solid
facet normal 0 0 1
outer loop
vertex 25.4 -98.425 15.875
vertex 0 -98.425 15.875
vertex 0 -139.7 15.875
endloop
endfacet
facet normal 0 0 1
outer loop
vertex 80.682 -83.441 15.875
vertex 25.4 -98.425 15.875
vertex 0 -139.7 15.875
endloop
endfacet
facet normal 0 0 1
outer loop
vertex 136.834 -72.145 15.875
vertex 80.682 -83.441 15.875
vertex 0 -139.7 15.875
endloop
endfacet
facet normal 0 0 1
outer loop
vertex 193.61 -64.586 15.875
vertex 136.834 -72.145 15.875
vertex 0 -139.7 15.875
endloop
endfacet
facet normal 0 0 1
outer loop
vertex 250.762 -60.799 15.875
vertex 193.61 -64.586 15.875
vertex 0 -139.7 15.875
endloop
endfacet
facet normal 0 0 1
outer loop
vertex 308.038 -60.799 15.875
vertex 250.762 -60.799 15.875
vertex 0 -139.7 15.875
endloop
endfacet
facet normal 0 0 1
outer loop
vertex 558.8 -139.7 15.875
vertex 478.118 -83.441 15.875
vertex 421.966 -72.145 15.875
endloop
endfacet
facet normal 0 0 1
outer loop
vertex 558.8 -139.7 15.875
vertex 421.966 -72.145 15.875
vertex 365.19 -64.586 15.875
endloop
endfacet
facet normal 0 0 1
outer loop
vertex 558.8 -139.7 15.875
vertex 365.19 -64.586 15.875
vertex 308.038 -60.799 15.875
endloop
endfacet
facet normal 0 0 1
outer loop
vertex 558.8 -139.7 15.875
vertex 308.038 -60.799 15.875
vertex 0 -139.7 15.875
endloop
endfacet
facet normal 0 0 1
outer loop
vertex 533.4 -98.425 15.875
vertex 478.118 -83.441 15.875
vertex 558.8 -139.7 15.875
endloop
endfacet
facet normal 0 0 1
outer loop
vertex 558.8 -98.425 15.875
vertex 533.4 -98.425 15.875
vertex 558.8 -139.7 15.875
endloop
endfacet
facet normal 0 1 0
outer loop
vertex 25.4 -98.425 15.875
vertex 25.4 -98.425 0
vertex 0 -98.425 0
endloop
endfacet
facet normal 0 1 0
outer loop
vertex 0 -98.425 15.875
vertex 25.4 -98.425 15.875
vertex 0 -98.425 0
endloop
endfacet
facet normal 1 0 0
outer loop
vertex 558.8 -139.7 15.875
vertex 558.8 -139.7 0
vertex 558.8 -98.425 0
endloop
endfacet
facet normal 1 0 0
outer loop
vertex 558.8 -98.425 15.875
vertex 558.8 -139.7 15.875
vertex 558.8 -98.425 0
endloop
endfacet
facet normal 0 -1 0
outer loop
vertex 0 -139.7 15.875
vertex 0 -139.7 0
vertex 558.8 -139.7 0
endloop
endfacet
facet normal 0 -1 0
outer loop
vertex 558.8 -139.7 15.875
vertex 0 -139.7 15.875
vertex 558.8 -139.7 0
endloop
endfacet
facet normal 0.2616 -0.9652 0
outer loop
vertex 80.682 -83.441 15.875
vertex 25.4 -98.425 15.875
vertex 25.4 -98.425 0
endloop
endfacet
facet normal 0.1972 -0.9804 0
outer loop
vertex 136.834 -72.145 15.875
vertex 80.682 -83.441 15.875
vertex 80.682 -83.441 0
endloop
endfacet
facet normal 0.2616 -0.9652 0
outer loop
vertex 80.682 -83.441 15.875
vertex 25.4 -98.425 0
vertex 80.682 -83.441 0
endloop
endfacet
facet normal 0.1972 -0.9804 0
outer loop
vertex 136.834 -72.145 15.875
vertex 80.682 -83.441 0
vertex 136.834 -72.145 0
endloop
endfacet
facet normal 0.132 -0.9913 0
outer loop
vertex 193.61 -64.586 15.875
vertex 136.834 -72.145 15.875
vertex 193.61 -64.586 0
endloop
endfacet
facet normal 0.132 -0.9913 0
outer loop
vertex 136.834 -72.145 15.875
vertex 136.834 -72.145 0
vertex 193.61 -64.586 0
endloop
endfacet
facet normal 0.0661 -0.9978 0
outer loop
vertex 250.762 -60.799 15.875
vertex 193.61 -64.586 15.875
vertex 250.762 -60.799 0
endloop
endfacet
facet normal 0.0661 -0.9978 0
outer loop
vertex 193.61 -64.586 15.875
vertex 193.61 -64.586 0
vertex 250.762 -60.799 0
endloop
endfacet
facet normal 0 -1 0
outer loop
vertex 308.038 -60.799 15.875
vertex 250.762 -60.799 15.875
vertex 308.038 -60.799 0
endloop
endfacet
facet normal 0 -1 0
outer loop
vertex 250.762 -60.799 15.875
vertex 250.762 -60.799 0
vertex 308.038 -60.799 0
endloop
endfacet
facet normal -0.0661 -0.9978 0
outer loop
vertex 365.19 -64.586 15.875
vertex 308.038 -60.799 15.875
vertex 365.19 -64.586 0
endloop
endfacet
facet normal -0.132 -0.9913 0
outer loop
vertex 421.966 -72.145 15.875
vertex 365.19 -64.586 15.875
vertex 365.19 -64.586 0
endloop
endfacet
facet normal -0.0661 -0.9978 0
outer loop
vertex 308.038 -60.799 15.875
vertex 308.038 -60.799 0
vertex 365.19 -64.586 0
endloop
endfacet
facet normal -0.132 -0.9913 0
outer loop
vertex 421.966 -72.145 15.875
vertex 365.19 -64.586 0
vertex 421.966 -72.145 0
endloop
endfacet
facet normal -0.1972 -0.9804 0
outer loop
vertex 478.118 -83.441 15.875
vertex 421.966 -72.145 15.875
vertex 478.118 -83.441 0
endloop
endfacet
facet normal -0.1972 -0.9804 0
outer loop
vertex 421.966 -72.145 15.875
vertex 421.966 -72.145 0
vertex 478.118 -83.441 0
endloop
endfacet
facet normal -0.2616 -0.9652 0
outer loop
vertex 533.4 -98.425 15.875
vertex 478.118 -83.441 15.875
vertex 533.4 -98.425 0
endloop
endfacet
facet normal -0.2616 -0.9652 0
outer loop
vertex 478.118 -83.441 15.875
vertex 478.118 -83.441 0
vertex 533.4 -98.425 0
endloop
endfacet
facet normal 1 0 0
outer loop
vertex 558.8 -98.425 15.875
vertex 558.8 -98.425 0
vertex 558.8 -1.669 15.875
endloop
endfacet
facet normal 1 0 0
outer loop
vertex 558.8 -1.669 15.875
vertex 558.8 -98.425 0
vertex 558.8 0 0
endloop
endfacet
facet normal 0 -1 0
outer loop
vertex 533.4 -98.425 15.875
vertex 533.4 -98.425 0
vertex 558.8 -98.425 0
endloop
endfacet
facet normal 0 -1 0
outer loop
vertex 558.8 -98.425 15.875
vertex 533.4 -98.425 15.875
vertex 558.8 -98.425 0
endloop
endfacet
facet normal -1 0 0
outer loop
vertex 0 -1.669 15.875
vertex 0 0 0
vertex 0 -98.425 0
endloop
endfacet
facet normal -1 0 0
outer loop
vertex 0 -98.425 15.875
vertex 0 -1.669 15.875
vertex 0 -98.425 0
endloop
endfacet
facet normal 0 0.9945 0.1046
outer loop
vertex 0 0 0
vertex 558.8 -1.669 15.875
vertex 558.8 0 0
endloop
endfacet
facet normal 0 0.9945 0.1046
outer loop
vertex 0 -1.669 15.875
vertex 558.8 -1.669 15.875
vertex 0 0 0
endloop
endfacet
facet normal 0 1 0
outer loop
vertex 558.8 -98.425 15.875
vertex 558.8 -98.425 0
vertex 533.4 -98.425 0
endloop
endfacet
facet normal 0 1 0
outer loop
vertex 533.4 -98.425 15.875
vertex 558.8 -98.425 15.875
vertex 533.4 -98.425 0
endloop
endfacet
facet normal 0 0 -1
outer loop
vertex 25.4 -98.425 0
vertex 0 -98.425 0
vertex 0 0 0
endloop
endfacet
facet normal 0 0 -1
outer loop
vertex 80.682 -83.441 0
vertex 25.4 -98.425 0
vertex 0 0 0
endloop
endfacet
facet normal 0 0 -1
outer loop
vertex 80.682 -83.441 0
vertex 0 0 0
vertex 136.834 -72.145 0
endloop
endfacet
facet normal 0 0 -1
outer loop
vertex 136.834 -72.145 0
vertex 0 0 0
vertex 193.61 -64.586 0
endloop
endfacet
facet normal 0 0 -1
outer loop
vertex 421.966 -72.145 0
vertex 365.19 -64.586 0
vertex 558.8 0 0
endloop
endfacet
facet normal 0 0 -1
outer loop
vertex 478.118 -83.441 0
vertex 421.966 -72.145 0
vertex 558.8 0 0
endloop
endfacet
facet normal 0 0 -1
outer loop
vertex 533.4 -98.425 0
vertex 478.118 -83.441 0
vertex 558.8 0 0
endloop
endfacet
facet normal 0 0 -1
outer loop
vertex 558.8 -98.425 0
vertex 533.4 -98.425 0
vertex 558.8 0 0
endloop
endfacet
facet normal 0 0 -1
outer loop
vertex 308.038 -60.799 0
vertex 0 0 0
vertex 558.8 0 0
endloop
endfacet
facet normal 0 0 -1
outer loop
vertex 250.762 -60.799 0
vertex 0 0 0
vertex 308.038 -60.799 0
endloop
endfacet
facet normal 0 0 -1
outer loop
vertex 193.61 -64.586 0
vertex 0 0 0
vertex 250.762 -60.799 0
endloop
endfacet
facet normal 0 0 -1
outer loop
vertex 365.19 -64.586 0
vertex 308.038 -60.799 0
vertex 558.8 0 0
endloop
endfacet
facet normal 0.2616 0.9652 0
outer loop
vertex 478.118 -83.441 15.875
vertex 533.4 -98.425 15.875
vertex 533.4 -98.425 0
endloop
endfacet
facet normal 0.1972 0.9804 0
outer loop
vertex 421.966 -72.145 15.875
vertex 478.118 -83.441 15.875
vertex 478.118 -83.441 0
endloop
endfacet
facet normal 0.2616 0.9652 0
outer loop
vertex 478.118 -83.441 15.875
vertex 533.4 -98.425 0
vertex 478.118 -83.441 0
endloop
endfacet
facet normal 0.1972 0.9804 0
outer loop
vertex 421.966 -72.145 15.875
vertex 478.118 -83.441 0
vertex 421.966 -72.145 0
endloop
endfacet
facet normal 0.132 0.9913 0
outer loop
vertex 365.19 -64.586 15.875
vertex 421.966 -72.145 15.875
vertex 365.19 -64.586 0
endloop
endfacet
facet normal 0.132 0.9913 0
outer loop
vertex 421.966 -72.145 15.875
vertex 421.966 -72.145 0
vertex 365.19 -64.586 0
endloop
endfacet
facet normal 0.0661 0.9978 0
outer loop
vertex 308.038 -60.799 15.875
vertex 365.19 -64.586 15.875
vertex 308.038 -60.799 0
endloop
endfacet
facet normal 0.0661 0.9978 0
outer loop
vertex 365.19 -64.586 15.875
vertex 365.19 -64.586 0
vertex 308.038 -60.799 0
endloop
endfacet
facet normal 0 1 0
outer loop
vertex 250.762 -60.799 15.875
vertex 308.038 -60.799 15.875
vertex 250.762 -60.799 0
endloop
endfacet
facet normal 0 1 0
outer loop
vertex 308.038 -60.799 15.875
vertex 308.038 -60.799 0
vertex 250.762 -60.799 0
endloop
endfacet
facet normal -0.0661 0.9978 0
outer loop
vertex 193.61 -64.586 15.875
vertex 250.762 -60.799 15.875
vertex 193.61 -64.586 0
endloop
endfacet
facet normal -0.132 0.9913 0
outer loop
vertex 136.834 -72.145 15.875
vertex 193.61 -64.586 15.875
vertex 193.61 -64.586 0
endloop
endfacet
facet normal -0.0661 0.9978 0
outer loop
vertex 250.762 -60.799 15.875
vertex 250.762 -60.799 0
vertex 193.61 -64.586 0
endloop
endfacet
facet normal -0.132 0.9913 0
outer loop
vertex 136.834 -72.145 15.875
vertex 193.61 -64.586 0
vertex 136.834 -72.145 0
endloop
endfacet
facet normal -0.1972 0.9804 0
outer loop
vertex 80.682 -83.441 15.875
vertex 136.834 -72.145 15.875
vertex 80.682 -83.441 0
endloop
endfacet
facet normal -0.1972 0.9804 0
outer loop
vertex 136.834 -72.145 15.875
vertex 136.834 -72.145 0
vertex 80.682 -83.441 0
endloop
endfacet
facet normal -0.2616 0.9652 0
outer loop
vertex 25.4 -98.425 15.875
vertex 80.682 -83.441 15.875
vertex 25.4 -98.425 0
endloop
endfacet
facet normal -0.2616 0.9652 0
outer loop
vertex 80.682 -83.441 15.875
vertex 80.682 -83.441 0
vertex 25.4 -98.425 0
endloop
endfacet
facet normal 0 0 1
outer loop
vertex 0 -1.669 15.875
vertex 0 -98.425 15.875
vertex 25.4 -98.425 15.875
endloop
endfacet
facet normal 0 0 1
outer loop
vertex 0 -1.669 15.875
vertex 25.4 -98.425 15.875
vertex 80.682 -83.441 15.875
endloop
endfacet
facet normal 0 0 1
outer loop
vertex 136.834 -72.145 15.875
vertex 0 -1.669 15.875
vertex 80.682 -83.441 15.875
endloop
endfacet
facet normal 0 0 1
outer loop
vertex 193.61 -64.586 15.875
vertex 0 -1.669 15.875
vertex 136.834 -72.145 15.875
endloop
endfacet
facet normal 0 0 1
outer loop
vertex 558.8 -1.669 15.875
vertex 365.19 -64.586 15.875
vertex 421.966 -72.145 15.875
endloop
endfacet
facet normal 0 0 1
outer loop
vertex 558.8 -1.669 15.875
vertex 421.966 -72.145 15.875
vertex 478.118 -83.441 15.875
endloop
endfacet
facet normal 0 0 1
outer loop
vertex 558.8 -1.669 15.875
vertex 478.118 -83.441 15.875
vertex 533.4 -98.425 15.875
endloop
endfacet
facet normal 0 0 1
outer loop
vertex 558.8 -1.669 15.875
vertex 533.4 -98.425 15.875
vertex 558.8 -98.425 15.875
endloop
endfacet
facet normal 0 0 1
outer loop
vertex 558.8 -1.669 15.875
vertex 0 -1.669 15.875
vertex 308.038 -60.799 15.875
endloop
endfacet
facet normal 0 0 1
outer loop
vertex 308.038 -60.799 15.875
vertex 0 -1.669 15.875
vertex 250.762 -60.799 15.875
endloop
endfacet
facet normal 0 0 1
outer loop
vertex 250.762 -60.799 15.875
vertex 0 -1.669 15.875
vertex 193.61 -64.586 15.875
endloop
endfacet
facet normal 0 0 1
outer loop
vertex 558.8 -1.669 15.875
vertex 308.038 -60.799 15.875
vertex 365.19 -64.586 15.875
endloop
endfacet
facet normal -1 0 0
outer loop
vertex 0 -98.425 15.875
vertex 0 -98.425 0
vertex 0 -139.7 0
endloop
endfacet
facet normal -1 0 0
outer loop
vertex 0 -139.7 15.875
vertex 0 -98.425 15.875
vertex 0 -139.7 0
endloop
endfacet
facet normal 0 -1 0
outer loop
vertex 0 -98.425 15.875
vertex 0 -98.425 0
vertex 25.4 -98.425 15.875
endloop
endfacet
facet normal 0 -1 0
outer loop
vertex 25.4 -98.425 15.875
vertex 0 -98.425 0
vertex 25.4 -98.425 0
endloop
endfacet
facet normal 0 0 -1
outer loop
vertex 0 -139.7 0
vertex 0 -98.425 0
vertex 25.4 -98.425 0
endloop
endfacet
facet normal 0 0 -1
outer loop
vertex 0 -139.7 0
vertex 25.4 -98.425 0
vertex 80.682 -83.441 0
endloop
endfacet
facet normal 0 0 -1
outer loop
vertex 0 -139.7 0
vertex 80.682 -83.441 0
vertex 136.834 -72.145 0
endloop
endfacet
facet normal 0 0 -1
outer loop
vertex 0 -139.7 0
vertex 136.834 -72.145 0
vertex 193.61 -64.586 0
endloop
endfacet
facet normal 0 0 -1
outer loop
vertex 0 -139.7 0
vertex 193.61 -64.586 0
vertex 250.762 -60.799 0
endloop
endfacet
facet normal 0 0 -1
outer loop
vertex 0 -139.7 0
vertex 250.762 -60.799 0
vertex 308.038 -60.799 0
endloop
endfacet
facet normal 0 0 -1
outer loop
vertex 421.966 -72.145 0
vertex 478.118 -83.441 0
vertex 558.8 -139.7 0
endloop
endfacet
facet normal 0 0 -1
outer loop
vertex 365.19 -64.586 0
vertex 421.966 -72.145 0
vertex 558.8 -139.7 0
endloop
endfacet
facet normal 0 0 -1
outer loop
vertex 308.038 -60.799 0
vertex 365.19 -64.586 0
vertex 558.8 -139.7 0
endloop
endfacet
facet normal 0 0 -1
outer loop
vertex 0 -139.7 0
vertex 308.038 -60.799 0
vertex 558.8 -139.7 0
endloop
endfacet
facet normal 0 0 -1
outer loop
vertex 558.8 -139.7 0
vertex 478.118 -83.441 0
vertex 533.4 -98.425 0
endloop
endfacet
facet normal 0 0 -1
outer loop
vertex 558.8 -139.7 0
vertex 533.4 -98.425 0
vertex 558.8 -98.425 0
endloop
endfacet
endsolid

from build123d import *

# Parameters (mm, degrees)
F1_DEPTH = 15.875
F2_DEPTH = 15.875
F3_SIZE2 = 1.66852
F3_SIZE  = 15.87499


# Not quite as in the source:
# - a fillet or chamfer is up to 0.001 mm smaller than in the source, because OpenCascade refuses the exact size


with BuildPart() as f1:
    # F0 (on Top) → F1 (new body)
    with BuildSketch(Plane.XY):
        with BuildLine():
            Line((558.8, 0), (0, 0))
            Line((0, 0), (0, -98.425))
            Line((0, -98.425), (25.4, -98.425))
            ThreePointArc((25.4, -98.425), (279.4, -60.325), (533.4, -98.425))
            Line((533.4, -98.425), (558.8, -98.425))
            Line((558.8, -98.425), (558.8, 0))
        make_face()
    extrude(amount=F1_DEPTH)

    # F3 (size 15.875 and 1.6685297348 in the source; OpenCascade refuses exactly that, so slightly less here)
    f3_edges = [f1.edges().sort_by_distance(p)[0] for p in [
        (279.4, 0, 15.875),
    ]]
    f3_side = f1.faces().sort_by_distance((279.4, 0, 7.9375))[0]
    chamfer(f3_edges, length=F3_SIZE, length2=F3_SIZE2, reference=f3_side)


with BuildPart() as f2:
    # F0 (on Top) → F2 (new body)
    with BuildSketch(Plane.XY):
        with BuildLine():
            Line((25.4, -98.425), (0, -98.425))
            Line((0, -98.425), (0, -139.7))
            Line((0, -139.7), (558.8, -139.7))
            Line((558.8, -139.7), (558.8, -98.425))
            Line((558.8, -98.425), (533.4, -98.425))
            ThreePointArc((533.4, -98.425), (279.4, -60.325), (25.4, -98.425))
        make_face()
    extrude(amount=F2_DEPTH)


solid = Compound([f1.part, f2.part])
